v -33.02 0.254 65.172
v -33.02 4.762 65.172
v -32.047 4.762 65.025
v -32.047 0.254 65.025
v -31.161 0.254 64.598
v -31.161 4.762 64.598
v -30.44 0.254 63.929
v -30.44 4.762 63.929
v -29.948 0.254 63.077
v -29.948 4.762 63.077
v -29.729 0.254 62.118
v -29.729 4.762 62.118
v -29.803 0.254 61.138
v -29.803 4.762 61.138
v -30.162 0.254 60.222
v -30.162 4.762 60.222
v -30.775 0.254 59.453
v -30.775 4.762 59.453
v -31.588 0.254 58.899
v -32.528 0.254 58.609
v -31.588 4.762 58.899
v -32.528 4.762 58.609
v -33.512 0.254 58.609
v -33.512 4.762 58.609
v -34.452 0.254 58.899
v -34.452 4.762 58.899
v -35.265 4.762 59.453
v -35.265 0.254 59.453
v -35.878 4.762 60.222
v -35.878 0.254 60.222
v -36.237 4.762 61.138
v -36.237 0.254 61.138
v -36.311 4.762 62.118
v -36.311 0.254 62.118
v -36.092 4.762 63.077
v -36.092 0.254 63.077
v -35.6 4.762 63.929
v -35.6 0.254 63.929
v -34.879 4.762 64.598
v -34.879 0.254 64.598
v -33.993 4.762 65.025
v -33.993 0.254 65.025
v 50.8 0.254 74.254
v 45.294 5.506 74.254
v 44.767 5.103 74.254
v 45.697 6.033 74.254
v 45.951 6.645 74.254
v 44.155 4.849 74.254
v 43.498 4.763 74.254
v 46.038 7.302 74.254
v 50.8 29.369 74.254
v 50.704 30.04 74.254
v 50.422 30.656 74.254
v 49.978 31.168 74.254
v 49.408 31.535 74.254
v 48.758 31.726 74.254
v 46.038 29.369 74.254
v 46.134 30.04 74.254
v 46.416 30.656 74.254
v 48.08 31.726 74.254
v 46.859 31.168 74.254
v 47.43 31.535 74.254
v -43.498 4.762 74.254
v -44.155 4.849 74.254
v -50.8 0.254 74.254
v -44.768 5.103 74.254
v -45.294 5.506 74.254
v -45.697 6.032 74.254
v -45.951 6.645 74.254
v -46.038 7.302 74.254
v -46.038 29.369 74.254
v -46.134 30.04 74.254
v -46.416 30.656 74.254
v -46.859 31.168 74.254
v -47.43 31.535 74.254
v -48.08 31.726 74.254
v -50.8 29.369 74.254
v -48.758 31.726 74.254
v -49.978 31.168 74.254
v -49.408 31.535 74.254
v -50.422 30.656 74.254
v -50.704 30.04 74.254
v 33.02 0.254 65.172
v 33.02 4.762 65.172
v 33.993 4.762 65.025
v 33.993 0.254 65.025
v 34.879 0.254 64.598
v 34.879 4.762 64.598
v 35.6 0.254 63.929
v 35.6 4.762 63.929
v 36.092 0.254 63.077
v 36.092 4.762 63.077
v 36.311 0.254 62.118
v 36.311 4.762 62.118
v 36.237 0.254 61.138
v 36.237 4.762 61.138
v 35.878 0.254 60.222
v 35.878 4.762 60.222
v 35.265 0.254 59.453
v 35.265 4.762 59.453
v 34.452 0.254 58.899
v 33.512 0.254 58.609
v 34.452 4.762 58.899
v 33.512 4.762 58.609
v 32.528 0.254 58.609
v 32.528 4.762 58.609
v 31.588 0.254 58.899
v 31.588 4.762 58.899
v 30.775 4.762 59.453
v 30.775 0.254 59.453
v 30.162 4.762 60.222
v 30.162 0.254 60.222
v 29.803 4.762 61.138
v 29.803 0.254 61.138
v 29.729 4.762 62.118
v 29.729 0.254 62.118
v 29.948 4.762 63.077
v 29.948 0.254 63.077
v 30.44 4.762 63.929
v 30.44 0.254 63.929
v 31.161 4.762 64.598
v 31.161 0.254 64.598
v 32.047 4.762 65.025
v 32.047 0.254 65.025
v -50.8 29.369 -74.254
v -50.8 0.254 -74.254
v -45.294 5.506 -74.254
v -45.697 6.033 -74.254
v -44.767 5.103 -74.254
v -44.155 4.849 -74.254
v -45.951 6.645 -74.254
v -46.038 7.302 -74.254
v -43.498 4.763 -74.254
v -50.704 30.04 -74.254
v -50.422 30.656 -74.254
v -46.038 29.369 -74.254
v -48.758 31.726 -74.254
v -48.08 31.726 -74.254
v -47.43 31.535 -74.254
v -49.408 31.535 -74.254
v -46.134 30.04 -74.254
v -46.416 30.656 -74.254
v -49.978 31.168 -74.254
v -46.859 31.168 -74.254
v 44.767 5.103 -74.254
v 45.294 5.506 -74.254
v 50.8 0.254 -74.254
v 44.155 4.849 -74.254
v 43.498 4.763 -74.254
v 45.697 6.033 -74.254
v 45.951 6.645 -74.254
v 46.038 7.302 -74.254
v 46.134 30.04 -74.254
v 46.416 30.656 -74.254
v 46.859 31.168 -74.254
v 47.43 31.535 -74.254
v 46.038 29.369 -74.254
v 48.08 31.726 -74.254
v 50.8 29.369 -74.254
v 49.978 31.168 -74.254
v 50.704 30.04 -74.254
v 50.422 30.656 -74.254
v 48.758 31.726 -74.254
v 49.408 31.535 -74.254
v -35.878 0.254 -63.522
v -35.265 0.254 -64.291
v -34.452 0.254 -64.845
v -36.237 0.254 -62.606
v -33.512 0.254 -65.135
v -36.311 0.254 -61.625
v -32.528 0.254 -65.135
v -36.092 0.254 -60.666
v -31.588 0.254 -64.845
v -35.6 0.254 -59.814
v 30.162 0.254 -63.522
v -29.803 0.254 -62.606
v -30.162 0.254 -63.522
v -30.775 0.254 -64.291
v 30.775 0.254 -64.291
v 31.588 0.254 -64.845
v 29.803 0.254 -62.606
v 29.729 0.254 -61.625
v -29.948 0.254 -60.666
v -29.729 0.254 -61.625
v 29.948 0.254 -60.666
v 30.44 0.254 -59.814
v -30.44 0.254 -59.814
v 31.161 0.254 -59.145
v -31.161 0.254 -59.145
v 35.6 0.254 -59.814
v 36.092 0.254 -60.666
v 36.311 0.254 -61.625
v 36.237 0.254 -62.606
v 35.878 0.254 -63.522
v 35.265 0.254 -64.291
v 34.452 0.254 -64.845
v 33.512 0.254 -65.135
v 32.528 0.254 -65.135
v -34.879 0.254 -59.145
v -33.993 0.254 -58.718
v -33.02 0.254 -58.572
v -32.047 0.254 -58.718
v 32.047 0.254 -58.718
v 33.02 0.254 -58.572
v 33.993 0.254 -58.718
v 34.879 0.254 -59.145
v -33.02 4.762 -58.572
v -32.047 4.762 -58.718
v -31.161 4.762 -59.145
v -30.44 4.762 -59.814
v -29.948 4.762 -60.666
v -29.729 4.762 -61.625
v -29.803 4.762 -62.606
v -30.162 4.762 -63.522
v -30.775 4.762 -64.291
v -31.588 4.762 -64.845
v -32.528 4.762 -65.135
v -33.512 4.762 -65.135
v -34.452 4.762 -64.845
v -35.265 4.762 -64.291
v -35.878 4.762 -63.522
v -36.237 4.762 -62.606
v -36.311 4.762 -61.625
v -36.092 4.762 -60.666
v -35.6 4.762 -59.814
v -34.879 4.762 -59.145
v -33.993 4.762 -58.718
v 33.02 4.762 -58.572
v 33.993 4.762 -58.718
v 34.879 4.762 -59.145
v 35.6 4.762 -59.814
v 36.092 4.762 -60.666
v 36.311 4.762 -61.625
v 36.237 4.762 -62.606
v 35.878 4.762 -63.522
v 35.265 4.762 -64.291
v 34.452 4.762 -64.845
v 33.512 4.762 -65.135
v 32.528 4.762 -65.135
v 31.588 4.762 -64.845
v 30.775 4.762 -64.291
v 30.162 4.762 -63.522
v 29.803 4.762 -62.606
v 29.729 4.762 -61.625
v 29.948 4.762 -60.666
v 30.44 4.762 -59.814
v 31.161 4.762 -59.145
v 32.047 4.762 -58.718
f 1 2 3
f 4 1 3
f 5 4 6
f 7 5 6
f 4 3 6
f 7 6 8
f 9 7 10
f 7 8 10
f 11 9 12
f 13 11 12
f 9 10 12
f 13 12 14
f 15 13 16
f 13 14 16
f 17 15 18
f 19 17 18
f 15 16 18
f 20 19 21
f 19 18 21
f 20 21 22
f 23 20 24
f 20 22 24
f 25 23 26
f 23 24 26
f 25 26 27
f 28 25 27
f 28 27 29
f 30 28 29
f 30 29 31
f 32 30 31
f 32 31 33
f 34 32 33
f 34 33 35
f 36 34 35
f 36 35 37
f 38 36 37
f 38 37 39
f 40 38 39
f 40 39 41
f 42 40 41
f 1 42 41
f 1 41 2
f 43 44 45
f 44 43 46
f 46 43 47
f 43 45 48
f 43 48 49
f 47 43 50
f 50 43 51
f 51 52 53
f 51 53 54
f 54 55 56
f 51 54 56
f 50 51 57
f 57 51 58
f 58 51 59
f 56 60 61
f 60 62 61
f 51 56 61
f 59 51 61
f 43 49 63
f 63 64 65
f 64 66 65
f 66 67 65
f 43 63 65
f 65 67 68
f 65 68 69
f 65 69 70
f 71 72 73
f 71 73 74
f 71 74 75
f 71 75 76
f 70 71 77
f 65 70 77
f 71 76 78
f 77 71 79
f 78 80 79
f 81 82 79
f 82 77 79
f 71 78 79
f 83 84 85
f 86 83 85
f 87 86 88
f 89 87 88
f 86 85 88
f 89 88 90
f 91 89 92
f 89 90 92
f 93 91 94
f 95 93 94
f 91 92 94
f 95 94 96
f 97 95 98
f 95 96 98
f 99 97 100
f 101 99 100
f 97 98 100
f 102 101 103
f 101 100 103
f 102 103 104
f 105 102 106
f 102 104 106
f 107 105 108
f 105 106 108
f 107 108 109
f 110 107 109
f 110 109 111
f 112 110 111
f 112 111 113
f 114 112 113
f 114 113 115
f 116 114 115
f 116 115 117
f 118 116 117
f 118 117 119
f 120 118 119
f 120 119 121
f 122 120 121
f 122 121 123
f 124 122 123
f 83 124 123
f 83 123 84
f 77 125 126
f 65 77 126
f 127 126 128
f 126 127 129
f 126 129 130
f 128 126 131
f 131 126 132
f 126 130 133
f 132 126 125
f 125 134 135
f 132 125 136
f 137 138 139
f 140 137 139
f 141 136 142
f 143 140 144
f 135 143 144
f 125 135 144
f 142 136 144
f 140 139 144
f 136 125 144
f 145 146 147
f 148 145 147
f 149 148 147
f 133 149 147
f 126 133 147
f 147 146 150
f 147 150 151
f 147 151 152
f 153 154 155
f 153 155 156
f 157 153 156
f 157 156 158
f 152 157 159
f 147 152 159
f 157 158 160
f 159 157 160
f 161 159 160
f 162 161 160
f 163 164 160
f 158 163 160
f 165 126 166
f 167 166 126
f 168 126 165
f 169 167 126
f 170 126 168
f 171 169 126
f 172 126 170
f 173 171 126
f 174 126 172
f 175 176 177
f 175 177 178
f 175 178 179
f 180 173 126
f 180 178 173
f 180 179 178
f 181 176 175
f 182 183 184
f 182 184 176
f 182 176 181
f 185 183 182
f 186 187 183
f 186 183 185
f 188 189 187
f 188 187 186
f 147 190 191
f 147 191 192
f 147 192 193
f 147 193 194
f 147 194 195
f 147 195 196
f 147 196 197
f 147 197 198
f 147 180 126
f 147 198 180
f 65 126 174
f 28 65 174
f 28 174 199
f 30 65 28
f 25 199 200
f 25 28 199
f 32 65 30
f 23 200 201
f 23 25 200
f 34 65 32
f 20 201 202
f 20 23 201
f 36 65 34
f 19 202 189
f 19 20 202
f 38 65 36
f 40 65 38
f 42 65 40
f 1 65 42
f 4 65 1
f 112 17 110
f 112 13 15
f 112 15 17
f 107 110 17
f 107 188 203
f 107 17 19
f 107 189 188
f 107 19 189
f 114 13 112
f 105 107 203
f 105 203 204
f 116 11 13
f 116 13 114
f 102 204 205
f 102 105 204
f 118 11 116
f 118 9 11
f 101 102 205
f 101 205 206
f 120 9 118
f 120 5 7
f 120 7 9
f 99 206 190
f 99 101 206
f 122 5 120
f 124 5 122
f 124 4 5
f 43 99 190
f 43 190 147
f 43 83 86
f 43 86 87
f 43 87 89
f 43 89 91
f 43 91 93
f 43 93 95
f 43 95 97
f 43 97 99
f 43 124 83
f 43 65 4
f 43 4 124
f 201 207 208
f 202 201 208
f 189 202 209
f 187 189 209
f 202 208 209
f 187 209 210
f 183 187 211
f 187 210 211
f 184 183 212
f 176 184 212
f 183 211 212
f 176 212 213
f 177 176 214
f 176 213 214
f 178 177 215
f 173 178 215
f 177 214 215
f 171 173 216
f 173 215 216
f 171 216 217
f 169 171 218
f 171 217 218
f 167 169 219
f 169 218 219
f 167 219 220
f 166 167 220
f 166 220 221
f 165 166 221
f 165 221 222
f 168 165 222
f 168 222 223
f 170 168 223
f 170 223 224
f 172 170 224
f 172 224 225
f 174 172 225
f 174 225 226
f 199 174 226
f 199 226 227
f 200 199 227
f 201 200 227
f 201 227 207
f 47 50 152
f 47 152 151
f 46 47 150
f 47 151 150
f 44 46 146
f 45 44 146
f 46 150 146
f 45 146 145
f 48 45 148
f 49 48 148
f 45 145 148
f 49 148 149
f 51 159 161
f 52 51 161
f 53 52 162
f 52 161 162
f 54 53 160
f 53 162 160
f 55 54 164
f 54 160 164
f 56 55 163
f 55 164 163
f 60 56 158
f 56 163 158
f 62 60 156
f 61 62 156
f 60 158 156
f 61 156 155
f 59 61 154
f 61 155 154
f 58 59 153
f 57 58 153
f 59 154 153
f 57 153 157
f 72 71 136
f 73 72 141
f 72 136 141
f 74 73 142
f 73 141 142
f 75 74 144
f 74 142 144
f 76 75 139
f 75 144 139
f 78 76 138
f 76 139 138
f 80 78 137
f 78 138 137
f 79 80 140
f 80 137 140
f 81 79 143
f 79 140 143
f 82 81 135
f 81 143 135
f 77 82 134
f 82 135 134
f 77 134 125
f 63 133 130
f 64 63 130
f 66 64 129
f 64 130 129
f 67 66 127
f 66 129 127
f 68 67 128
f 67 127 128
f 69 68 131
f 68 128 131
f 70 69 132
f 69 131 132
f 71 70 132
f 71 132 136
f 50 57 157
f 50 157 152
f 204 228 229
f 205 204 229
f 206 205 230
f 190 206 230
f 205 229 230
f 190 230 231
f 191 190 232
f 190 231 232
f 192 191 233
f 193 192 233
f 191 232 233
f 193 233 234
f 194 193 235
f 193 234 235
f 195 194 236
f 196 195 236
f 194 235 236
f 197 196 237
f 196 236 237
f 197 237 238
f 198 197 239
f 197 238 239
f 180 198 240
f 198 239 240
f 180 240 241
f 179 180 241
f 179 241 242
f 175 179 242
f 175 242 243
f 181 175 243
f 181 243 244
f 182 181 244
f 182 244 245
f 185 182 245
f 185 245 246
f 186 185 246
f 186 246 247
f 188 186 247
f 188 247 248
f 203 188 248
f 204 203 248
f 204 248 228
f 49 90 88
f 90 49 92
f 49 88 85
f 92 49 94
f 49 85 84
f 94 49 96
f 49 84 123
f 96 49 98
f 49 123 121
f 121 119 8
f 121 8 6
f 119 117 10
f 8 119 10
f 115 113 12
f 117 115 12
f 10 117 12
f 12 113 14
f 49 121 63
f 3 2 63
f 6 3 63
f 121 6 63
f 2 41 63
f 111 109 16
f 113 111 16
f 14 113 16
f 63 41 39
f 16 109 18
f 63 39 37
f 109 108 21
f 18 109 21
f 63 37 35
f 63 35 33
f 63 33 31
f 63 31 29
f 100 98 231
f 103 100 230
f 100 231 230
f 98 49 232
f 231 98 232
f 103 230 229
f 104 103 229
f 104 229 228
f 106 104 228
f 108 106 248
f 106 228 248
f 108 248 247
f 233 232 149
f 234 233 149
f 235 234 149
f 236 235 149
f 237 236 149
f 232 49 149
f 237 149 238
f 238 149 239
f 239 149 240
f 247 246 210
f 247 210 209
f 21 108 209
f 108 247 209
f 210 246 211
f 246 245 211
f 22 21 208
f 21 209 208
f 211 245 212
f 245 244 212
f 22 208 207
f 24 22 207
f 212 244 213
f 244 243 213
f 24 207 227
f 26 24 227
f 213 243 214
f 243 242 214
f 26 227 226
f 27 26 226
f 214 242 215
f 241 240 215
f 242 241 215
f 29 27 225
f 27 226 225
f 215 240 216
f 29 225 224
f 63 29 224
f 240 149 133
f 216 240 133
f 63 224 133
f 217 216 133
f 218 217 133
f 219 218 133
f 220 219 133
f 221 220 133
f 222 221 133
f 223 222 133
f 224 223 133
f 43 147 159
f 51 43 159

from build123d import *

# Parameters (mm, degrees)
EXTRUDE_THIN1_DEPTH  = 74.25436
FILLET1_RADIUS       = 2.38125
FILLET1_LENGTH       = 74.25436
FILLET2_R            = 2.54
MIRROR1_START        = -74.25436
MIRROR1_DEPTH        = 148.50872
M6_CLEARANCE_HOLE1_D = 6.6
CUT_EXTRUDE5_DEPTH   = 74.25436


# Read off the part's stored shape, not the designer's step: Mirror1
with BuildPart() as part:
    # Sketch4 → Extrude-Thin1 (new body)
    with BuildSketch(Plane.XY):
        Polygon((0, 0), (-50.8, 0), (-50.8, 31.75), (-46.0375, 31.75), (-46.0375, 4.7625), (0, 4.7625), align=None)
    extrude(amount=EXTRUDE_THIN1_DEPTH)

    # Fillet1: full round fillet: the end face becomes a half cylinder, R = half its width
    fillet1_face = Plane((-48.41875, 31.75, 37.12718), x_dir=(0, 0, -1), z_dir=(0, 1, 0))  # on the end face: x along it, z out of the body
    fillet1_slab = fillet1_face.offset(-FILLET1_RADIUS / 2) * Box(FILLET1_LENGTH, 2 * FILLET1_RADIUS, FILLET1_RADIUS, mode=Mode.PRIVATE)  # the body's end, R deep
    fillet1_round = Plane((-48.41875, 29.36875, 37.12718), x_dir=(0, 1, 0), z_dir=(0, 0, -1)) * Cylinder(FILLET1_RADIUS, FILLET1_LENGTH, mode=Mode.PRIVATE)  # its axis R under the face
    add(fillet1_slab - fillet1_round, mode=Mode.SUBTRACT)

    # Fillet2
    fillet2_edges = [part.edges().sort_by_distance(p)[0] for p in [
        (-46.0375, 4.7625, 37.12718),
    ]]
    fillet(fillet2_edges, radius=FILLET2_R)

    # Mirror1 outline → Mirror1 (add)
    with BuildSketch(Plane.XY.offset(MIRROR1_START)):
        with BuildLine():
            ThreePointArc((-46.0375, 29.36875), (-48.41875, 31.75), (-50.8, 29.36875))
            Line((-50.8, 29.36875), (-50.8, 0))
            Line((-50.8, 0), (50.8, 0))
            Line((50.8, 0), (50.8, 29.36875))
            ThreePointArc((50.8, 29.36875), (48.41875, 31.75), (46.0375, 29.36875))
            Line((46.0375, 29.36875), (46.0375, 7.3025))
            ThreePointArc((46.0375, 7.3025), (45.293551224, 5.506448776), (43.4975, 4.7625))
            Line((43.4975, 4.7625), (-43.4975, 4.7625))
            ThreePointArc((-43.4975, 4.7625), (-45.293551224, 5.506448776), (-46.0375, 7.3025))
            Line((-46.0375, 7.3025), (-46.0375, 29.36875))
        make_face()
    extrude(amount=MIRROR1_DEPTH)

    # M6 Clearance Hole1 (through all)
    with Locations(Plane(origin=(-33.02, 0, 61.87186), x_dir=(0, 0, -1), z_dir=(0, -1, 0))):
        with Locations((0, 0), (0, 66.04), (123.74372, 0), (123.74372, 66.04)):
            Hole(M6_CLEARANCE_HOLE1_D / 2)

    # Sketch12 → Cut-Extrude5 (cut, symmetric)
    with BuildSketch(Plane.XY):
        Polygon((-50.8, 0.254), (50.8, 0.254), (50.8, 0), (50.8, -4.927247647), (-50.8, -4.927247647), (-50.8, 0), align=None)
    extrude(amount=CUT_EXTRUDE5_DEPTH, both=True, mode=Mode.SUBTRACT)


solid = part.part
